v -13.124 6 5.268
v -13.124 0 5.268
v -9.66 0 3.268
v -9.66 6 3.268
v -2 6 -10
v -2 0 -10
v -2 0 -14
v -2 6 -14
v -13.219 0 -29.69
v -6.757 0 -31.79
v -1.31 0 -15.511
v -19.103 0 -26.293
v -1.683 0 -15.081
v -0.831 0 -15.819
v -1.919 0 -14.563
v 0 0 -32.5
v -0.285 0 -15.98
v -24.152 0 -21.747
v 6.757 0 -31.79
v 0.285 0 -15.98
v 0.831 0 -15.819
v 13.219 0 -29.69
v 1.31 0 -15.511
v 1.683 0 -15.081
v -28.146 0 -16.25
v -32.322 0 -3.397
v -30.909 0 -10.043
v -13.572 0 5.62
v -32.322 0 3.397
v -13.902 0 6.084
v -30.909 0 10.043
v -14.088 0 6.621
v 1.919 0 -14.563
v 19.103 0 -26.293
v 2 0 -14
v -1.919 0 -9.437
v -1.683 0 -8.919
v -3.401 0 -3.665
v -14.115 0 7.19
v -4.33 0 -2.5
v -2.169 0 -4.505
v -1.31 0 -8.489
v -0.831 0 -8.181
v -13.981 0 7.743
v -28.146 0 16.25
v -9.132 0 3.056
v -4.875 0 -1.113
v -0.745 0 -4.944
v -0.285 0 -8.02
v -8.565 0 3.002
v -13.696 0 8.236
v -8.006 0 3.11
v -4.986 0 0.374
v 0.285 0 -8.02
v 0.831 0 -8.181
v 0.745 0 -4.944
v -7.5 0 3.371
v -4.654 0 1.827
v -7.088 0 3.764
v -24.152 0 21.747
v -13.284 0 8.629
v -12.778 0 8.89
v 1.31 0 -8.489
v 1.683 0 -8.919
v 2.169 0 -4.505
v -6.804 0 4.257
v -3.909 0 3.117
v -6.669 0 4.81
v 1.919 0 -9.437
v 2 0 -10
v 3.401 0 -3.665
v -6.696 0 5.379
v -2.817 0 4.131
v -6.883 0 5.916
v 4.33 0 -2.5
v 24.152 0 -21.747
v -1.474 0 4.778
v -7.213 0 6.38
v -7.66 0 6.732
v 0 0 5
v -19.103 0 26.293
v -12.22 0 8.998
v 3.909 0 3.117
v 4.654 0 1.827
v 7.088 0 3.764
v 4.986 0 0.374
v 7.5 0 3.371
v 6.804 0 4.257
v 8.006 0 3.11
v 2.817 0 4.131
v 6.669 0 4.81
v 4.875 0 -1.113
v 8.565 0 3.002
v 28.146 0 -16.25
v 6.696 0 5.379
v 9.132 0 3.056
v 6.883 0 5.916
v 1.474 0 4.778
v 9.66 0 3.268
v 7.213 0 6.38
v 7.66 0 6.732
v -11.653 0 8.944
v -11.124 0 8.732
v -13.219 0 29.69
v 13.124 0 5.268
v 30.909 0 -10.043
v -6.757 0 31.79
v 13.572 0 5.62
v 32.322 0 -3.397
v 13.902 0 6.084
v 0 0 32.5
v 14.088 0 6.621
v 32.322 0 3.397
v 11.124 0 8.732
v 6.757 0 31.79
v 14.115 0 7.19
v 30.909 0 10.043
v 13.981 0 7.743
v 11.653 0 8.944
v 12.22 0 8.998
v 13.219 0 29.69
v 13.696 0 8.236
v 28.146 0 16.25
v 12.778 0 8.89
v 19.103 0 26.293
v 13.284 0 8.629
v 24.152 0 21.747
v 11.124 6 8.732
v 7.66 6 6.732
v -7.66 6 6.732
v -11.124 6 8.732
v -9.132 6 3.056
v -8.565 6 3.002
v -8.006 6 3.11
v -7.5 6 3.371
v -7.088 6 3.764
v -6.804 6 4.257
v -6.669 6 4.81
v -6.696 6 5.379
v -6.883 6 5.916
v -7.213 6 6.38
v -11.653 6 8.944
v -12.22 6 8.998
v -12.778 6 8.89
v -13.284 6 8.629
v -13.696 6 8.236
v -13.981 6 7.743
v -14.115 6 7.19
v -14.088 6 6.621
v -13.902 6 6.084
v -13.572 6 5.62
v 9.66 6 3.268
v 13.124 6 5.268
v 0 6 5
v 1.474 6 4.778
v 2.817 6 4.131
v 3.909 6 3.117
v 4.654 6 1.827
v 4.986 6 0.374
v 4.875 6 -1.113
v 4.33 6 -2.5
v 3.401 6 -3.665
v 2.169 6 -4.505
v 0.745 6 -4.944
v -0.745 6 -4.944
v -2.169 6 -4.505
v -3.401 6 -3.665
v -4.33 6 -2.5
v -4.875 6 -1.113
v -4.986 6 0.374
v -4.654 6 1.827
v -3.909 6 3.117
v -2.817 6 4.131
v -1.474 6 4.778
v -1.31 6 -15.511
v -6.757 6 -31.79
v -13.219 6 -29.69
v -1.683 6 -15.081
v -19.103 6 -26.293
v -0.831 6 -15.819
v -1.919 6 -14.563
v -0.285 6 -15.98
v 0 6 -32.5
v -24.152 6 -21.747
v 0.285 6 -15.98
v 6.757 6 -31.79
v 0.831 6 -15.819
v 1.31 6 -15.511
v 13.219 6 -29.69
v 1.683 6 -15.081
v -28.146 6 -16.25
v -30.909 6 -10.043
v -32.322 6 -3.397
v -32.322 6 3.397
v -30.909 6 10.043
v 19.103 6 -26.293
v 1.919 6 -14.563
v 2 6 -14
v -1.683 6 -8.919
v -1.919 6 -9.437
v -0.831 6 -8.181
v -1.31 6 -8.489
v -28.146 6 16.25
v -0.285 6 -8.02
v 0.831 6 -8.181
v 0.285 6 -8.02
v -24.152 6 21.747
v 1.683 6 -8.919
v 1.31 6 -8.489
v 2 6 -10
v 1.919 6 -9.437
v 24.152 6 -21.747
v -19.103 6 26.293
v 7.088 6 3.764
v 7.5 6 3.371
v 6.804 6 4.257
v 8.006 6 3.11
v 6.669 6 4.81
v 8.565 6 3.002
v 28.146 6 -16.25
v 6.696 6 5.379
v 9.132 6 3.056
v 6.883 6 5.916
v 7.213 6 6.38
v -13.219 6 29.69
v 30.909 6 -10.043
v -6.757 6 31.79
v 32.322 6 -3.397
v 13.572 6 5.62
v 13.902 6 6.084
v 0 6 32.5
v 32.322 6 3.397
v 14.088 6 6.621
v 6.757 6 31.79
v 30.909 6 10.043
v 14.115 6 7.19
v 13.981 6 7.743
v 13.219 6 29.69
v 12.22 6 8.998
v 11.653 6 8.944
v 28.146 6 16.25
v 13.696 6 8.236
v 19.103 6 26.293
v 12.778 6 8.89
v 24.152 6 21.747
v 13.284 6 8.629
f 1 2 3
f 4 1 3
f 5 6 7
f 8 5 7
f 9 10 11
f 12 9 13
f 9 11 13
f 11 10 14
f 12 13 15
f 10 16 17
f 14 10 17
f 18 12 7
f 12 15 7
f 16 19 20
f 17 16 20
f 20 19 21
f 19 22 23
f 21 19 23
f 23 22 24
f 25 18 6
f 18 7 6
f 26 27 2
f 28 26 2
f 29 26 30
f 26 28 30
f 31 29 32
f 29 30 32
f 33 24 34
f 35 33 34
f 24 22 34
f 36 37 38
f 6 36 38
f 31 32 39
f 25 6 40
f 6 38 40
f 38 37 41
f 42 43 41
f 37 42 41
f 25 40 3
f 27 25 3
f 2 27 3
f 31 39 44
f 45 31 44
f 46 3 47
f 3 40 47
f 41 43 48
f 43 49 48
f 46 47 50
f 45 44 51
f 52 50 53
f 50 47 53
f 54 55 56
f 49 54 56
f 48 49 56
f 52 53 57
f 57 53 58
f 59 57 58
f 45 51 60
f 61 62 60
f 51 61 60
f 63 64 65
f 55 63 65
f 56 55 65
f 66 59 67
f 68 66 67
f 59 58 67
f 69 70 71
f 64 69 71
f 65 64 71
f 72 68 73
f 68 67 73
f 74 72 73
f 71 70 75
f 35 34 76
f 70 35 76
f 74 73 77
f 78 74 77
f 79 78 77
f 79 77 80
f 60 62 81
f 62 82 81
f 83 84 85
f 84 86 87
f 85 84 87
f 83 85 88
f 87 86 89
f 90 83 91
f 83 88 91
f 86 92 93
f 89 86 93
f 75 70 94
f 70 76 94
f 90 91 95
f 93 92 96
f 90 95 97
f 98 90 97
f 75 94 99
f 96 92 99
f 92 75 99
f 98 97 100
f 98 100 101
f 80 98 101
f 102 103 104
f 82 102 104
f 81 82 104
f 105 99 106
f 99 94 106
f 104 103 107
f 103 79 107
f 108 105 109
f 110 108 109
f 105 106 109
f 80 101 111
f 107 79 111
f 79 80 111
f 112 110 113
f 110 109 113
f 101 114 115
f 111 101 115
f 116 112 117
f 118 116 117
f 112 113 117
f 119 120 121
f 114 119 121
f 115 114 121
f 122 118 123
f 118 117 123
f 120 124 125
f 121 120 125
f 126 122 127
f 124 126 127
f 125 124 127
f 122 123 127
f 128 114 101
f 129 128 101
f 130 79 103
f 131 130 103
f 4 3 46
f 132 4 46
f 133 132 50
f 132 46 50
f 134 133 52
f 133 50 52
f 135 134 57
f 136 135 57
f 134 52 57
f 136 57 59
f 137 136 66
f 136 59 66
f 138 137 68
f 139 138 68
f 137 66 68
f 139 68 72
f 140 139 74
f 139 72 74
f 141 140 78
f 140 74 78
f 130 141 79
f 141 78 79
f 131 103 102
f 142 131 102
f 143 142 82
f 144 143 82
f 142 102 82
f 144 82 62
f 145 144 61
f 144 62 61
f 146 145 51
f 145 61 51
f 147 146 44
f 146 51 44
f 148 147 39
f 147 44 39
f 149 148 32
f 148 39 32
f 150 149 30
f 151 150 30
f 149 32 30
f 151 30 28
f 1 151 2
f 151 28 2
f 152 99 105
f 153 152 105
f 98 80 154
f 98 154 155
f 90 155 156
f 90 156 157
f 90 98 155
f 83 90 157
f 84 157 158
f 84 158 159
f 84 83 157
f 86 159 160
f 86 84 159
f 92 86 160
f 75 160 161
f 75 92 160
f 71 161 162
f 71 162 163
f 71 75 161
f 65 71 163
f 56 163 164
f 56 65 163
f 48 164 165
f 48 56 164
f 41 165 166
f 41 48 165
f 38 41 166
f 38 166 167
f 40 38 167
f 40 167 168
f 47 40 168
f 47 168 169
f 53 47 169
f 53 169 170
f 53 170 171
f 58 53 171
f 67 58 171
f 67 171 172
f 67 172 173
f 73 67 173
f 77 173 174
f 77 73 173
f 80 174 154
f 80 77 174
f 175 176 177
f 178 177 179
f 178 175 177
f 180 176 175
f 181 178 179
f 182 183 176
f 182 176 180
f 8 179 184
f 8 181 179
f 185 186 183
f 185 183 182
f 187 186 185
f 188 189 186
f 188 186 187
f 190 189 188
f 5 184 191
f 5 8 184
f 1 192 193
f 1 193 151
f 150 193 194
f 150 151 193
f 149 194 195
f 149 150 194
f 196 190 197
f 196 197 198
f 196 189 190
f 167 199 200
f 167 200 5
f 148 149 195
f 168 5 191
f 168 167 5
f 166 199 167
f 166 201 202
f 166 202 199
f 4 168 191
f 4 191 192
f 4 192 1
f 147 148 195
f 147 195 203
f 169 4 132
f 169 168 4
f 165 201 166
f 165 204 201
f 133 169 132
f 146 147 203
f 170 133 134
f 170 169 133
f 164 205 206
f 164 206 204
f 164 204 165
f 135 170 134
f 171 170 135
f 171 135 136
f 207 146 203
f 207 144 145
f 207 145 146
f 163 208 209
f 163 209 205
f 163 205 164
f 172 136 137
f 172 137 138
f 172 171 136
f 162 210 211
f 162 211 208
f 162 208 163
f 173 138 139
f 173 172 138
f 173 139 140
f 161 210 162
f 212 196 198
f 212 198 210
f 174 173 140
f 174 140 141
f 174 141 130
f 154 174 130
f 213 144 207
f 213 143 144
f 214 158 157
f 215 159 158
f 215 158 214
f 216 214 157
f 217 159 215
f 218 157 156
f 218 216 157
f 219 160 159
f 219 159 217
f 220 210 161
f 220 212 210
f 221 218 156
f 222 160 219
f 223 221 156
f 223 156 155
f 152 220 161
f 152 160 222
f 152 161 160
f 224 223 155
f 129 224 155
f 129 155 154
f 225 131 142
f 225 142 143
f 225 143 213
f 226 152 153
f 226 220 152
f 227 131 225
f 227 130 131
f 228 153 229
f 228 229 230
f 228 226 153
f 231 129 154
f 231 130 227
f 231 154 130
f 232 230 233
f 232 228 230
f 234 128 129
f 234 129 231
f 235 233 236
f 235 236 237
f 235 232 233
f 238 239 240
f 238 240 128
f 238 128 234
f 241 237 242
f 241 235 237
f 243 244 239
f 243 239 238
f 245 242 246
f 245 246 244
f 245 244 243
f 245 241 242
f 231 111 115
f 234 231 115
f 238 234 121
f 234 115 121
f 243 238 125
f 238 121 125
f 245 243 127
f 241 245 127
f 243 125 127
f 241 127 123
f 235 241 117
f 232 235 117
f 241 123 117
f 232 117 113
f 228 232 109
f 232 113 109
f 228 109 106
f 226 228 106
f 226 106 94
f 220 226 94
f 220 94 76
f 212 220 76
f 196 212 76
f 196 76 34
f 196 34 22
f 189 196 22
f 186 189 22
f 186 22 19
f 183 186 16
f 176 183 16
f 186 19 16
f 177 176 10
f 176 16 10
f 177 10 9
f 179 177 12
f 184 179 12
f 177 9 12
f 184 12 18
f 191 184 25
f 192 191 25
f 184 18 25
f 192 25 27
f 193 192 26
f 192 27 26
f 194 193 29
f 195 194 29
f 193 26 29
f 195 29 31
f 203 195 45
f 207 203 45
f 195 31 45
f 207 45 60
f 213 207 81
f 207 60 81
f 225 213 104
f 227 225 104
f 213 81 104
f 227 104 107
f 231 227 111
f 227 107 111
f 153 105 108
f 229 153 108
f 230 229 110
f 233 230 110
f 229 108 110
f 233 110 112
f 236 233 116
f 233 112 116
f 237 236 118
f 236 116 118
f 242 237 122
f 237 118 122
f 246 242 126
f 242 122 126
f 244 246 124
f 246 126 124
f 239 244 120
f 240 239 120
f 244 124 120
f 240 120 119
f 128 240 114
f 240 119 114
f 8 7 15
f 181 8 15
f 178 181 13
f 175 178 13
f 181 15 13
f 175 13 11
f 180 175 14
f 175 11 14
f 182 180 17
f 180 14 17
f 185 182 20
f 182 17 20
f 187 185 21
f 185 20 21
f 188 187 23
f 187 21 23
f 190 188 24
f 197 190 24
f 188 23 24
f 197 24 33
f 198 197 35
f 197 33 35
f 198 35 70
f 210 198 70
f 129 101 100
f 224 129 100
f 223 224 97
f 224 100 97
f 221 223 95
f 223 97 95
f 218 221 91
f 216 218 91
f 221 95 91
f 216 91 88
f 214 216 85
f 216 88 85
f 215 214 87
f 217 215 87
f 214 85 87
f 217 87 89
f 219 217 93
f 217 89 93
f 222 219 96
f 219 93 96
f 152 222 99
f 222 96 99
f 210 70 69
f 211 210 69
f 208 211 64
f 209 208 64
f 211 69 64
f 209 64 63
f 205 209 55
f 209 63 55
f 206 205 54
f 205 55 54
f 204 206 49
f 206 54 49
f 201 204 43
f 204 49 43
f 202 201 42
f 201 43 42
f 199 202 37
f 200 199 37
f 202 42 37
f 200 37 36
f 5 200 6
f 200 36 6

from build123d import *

# Parameters (mm, degrees)
SKETCH1_R           = 32.5
SKETCH1_R_2         = 5
BOSS_EXTRUDE1_DEPTH = 6


with BuildPart() as part:
    # Sketch1 → Boss-Extrude1 (new body)
    with BuildSketch(Plane(origin=(0, 0, 0), x_dir=(1, 0, 0), z_dir=(0, 1, 0))):
        with Locations(Location((0, 0, 0), (0, 0, 270))):
            Circle(SKETCH1_R)
        with Locations(Location((0, 0, 0), (0, 0, 270))):
            Circle(SKETCH1_R_2, mode=Mode.SUBTRACT)
        with BuildLine():
            Line((-2, 10), (-2, 14))
            ThreePointArc((-2, 14), (0, 16), (2, 14))
            Line((2, 14), (2, 10))
            ThreePointArc((2, 10), (0, 8), (-2, 10))
        make_face(mode=Mode.SUBTRACT)
        with BuildLine():
            Line((9.660254038, -3.267949192), (13.124355653, -5.267949192))
            ThreePointArc((13.124355653, -5.267949192), (13.856406461, -8), (11.124355653, -8.732050808))
            Line((11.124355653, -8.732050808), (7.660254038, -6.732050808))
            ThreePointArc((7.660254038, -6.732050808), (6.92820323, -4), (9.660254038, -3.267949192))
        make_face(mode=Mode.SUBTRACT)
        with BuildLine():
            Line((-7.660254038, -6.732050808), (-11.124355653, -8.732050808))
            ThreePointArc((-11.124355653, -8.732050808), (-13.856406461, -8), (-13.124355653, -5.267949192))
            Line((-13.124355653, -5.267949192), (-9.660254038, -3.267949192))
            ThreePointArc((-9.660254038, -3.267949192), (-6.92820323, -4), (-7.660254038, -6.732050808))
        make_face(mode=Mode.SUBTRACT)
    extrude(amount=BOSS_EXTRUDE1_DEPTH)


solid = part.part
